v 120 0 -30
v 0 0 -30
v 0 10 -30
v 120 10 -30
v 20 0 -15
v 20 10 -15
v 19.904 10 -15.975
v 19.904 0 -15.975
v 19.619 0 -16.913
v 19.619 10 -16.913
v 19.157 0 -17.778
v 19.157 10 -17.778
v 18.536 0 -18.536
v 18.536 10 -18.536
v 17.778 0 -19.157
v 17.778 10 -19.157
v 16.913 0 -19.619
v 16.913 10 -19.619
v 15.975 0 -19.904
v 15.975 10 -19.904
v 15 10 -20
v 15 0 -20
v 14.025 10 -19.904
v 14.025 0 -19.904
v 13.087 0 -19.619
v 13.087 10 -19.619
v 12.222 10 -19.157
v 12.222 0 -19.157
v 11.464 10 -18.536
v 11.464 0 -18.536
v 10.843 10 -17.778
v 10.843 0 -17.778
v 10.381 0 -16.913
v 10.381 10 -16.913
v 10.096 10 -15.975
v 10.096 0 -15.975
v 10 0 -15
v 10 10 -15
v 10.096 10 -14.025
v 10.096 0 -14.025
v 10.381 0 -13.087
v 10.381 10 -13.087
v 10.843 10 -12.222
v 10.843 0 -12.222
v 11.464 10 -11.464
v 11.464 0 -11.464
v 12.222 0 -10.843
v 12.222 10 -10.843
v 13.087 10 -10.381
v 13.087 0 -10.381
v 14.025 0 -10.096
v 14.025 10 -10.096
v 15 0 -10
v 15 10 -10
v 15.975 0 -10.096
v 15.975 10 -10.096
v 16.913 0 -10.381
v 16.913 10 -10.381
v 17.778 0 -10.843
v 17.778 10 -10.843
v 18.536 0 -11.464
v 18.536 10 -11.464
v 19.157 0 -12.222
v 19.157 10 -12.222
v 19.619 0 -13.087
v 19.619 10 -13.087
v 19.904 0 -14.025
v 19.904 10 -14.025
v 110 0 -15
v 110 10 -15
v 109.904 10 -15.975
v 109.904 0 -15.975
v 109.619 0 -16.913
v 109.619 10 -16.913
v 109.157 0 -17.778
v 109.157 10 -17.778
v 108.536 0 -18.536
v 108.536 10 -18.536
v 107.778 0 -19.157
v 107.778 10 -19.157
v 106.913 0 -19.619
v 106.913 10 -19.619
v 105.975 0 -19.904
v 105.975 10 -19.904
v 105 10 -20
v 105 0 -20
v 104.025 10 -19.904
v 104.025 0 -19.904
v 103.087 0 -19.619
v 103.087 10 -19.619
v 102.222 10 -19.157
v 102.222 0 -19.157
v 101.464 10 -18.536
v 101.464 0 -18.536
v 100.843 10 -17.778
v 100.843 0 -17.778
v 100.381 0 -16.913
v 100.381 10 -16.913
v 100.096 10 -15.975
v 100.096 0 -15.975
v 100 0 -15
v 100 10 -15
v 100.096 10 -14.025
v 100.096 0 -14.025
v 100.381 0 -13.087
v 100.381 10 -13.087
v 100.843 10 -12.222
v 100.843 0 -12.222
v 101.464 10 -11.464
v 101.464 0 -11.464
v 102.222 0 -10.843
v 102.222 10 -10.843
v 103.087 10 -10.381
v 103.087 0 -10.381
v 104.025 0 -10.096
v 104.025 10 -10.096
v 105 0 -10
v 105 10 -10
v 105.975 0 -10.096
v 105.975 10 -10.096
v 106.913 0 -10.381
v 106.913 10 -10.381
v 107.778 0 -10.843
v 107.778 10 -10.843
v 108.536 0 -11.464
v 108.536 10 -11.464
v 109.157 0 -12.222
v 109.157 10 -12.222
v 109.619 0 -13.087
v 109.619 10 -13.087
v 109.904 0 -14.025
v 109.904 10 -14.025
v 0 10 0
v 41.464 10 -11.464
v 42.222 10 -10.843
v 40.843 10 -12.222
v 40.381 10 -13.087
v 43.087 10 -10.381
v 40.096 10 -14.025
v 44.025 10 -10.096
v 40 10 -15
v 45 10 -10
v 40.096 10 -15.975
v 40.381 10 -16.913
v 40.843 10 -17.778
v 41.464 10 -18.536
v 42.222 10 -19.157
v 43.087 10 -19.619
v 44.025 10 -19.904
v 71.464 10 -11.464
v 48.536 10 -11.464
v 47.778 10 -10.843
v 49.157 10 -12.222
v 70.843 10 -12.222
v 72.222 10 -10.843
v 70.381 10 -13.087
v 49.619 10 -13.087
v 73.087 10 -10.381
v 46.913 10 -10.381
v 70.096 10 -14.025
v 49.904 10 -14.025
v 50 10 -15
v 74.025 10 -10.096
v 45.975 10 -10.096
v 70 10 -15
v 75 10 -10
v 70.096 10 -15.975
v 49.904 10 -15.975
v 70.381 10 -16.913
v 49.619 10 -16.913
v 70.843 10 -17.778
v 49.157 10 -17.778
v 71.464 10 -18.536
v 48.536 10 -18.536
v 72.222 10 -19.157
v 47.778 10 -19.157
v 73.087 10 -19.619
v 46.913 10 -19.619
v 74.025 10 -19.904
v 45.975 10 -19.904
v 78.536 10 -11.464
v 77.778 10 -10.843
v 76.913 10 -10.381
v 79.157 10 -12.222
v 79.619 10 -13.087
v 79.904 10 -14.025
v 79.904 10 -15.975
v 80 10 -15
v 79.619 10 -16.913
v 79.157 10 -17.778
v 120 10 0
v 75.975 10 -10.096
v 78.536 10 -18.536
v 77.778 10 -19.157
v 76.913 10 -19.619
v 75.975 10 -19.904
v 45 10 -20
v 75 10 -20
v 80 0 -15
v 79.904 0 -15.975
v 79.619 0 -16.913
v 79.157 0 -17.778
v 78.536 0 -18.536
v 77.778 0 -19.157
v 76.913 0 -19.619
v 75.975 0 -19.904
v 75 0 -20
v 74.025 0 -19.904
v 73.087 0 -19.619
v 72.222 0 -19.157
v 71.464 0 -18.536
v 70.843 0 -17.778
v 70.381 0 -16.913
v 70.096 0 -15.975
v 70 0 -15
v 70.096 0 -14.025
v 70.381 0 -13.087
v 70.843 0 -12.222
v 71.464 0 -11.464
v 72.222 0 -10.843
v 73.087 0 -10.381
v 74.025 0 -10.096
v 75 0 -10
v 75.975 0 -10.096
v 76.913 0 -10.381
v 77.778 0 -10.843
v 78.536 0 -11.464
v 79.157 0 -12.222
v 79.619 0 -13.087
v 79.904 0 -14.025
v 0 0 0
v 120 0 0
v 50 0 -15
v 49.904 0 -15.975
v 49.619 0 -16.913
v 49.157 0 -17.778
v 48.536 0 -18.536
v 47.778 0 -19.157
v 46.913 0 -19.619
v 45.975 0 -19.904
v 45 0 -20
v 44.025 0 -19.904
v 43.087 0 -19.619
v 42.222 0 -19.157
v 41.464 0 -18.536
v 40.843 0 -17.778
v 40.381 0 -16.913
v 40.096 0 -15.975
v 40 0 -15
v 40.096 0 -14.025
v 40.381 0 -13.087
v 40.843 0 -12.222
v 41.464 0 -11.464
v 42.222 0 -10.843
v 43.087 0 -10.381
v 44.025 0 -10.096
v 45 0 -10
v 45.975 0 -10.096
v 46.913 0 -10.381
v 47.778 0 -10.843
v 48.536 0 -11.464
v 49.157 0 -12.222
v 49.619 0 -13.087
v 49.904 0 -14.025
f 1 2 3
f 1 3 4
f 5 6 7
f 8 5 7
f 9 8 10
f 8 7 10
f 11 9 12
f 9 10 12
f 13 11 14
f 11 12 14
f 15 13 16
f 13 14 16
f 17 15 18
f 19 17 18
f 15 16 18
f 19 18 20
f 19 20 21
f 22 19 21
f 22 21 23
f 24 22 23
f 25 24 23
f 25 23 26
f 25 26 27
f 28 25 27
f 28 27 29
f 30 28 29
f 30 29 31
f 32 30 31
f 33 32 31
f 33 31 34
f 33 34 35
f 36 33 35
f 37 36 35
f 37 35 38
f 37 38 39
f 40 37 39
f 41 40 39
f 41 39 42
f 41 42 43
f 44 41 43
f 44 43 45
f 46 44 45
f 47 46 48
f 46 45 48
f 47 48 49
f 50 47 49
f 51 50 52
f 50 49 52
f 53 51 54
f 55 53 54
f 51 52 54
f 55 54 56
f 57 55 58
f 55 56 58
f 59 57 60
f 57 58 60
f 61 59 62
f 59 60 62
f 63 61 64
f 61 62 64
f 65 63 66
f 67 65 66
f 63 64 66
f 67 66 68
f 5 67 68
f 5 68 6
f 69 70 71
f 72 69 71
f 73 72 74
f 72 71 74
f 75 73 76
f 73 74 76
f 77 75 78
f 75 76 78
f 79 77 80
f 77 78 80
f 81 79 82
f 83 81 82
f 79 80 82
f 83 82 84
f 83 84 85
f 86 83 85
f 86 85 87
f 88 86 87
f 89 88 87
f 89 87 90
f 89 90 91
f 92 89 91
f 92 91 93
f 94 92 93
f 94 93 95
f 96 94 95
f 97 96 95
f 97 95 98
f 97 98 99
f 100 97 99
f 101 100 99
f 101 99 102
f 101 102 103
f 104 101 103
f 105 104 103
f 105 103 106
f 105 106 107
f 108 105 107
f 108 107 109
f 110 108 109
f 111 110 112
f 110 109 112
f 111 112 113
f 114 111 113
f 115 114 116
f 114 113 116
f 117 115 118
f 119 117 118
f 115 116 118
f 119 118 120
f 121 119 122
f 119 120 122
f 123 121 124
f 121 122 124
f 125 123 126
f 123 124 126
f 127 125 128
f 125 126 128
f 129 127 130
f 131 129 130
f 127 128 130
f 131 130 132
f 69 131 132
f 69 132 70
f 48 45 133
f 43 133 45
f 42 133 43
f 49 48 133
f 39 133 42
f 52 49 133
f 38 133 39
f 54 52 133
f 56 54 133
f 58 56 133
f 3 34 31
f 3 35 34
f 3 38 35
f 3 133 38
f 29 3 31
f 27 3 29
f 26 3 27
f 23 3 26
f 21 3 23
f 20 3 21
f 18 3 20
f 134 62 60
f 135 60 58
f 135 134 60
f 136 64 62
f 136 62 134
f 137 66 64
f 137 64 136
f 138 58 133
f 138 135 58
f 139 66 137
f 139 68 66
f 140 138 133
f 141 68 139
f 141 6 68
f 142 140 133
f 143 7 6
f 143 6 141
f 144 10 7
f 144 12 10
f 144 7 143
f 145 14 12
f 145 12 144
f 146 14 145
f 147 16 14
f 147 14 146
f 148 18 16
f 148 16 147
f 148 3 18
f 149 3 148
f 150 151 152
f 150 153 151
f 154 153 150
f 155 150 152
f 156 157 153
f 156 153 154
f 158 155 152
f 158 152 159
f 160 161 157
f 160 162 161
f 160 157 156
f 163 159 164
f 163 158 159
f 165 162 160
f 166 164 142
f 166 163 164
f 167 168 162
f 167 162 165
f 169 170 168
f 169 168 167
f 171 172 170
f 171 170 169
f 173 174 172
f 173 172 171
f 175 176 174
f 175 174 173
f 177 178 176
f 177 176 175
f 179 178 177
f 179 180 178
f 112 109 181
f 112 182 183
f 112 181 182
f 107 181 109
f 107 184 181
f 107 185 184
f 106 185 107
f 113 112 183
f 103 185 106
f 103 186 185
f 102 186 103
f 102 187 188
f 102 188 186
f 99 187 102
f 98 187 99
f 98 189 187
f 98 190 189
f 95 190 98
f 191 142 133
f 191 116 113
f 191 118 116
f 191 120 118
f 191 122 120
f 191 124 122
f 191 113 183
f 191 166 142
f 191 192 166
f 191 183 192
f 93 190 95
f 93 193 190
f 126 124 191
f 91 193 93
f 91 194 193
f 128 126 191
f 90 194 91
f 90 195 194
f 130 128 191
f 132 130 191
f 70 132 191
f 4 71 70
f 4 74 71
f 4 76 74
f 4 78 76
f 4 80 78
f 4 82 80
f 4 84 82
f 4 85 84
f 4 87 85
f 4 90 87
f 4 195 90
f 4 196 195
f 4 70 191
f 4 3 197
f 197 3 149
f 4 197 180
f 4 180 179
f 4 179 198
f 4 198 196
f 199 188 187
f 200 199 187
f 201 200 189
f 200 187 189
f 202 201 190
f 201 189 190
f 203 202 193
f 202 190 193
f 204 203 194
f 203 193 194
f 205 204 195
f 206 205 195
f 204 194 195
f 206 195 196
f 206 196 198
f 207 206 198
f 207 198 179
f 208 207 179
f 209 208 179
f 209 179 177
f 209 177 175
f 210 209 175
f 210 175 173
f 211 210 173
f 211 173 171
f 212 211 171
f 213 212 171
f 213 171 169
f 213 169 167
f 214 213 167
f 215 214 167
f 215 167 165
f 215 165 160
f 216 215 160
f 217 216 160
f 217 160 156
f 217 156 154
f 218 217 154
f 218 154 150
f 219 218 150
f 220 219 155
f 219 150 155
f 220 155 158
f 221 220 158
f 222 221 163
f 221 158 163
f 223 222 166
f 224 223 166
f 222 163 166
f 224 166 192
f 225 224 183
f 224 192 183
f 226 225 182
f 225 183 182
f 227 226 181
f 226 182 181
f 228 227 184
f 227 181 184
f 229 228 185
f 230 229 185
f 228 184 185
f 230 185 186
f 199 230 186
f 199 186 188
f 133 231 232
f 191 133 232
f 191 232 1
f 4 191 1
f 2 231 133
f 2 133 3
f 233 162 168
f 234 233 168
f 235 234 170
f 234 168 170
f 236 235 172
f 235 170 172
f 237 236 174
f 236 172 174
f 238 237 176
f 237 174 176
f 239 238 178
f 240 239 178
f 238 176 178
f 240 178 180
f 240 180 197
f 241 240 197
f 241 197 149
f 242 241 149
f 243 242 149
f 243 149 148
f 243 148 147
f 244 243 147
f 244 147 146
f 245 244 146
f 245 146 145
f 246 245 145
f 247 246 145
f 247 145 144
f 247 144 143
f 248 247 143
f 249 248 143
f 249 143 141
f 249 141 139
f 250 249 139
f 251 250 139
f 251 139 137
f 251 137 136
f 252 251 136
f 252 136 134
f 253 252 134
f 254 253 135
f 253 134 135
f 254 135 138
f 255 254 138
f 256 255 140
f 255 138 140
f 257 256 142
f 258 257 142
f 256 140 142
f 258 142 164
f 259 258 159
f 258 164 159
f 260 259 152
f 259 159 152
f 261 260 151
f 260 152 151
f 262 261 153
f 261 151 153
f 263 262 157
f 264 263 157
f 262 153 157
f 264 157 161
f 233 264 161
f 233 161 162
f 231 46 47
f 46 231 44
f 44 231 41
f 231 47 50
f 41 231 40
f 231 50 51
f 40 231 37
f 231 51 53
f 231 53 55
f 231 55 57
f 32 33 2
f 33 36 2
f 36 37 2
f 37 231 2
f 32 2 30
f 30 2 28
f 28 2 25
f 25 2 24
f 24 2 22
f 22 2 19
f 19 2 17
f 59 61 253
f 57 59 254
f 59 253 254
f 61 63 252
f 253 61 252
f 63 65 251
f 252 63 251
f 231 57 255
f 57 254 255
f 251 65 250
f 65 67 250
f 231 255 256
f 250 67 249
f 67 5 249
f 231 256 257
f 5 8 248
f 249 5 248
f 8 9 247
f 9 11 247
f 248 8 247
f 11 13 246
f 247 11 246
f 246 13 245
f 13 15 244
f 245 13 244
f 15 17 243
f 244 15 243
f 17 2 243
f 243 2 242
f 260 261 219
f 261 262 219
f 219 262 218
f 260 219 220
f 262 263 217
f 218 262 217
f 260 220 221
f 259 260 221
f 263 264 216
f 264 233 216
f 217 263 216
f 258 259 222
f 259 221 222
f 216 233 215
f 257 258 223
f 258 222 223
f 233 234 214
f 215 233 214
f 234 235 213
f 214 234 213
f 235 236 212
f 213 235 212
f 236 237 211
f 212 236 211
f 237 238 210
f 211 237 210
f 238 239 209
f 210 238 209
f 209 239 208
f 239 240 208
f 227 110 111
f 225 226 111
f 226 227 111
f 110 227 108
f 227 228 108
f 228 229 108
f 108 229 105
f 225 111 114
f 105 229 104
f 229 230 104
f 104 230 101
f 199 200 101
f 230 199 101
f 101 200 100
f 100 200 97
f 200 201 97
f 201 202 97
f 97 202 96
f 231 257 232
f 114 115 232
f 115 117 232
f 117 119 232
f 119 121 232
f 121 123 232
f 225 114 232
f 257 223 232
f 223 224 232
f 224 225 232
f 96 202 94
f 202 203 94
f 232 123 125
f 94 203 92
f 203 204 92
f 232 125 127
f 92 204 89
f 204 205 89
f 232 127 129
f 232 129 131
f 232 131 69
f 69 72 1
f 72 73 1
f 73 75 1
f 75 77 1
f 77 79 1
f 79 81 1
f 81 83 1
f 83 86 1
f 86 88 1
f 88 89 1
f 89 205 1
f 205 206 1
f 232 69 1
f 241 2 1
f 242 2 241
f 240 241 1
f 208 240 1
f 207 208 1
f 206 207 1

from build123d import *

# Parameters (mm, degrees)
SKETCH1_W            = 120
SKETCH1_H            = 30
BOSS_EXTRUDE1_DEPTH  = 10
SKETCH2_R            = 5
CUT_EXTRUDE1_DEPTH   = 11
LPATTERN1_COUNT      = 4
LPATTERN1_PITCH      = 30
LPATTERN1_COUNT_DIR2 = 4
LPATTERN1_PITCH_DIR2 = 30


with BuildPart() as part:
    # Sketch1 → Boss-Extrude1 (new body)
    with BuildSketch(Plane(origin=(0, 0, 0), x_dir=(1, 0, 0), z_dir=(0, 1, 0))):
        with Locations((60, 15)):
            Rectangle(SKETCH1_W, SKETCH1_H)
    extrude(amount=BOSS_EXTRUDE1_DEPTH)

    # Sketch2 → Cut-Extrude1 (cut, through all)
    with BuildSketch(Plane(origin=(0, 10, 0), x_dir=(1, 0, 0), z_dir=(0, 1, 0))):
        with Locations((15, 15)):
            Circle(SKETCH2_R)
    cut_extrude1 = extrude(amount=-CUT_EXTRUDE1_DEPTH, mode=Mode.SUBTRACT)

    # LPattern1: Cut-Extrude1 4 × 4
    with Locations(*[(i * LPATTERN1_PITCH, 0, j * LPATTERN1_PITCH_DIR2) for i in range(LPATTERN1_COUNT) for j in range(LPATTERN1_COUNT_DIR2) if (i, j) != (0, 0)]):
        add(cut_extrude1, mode=Mode.SUBTRACT)


solid = part.part
